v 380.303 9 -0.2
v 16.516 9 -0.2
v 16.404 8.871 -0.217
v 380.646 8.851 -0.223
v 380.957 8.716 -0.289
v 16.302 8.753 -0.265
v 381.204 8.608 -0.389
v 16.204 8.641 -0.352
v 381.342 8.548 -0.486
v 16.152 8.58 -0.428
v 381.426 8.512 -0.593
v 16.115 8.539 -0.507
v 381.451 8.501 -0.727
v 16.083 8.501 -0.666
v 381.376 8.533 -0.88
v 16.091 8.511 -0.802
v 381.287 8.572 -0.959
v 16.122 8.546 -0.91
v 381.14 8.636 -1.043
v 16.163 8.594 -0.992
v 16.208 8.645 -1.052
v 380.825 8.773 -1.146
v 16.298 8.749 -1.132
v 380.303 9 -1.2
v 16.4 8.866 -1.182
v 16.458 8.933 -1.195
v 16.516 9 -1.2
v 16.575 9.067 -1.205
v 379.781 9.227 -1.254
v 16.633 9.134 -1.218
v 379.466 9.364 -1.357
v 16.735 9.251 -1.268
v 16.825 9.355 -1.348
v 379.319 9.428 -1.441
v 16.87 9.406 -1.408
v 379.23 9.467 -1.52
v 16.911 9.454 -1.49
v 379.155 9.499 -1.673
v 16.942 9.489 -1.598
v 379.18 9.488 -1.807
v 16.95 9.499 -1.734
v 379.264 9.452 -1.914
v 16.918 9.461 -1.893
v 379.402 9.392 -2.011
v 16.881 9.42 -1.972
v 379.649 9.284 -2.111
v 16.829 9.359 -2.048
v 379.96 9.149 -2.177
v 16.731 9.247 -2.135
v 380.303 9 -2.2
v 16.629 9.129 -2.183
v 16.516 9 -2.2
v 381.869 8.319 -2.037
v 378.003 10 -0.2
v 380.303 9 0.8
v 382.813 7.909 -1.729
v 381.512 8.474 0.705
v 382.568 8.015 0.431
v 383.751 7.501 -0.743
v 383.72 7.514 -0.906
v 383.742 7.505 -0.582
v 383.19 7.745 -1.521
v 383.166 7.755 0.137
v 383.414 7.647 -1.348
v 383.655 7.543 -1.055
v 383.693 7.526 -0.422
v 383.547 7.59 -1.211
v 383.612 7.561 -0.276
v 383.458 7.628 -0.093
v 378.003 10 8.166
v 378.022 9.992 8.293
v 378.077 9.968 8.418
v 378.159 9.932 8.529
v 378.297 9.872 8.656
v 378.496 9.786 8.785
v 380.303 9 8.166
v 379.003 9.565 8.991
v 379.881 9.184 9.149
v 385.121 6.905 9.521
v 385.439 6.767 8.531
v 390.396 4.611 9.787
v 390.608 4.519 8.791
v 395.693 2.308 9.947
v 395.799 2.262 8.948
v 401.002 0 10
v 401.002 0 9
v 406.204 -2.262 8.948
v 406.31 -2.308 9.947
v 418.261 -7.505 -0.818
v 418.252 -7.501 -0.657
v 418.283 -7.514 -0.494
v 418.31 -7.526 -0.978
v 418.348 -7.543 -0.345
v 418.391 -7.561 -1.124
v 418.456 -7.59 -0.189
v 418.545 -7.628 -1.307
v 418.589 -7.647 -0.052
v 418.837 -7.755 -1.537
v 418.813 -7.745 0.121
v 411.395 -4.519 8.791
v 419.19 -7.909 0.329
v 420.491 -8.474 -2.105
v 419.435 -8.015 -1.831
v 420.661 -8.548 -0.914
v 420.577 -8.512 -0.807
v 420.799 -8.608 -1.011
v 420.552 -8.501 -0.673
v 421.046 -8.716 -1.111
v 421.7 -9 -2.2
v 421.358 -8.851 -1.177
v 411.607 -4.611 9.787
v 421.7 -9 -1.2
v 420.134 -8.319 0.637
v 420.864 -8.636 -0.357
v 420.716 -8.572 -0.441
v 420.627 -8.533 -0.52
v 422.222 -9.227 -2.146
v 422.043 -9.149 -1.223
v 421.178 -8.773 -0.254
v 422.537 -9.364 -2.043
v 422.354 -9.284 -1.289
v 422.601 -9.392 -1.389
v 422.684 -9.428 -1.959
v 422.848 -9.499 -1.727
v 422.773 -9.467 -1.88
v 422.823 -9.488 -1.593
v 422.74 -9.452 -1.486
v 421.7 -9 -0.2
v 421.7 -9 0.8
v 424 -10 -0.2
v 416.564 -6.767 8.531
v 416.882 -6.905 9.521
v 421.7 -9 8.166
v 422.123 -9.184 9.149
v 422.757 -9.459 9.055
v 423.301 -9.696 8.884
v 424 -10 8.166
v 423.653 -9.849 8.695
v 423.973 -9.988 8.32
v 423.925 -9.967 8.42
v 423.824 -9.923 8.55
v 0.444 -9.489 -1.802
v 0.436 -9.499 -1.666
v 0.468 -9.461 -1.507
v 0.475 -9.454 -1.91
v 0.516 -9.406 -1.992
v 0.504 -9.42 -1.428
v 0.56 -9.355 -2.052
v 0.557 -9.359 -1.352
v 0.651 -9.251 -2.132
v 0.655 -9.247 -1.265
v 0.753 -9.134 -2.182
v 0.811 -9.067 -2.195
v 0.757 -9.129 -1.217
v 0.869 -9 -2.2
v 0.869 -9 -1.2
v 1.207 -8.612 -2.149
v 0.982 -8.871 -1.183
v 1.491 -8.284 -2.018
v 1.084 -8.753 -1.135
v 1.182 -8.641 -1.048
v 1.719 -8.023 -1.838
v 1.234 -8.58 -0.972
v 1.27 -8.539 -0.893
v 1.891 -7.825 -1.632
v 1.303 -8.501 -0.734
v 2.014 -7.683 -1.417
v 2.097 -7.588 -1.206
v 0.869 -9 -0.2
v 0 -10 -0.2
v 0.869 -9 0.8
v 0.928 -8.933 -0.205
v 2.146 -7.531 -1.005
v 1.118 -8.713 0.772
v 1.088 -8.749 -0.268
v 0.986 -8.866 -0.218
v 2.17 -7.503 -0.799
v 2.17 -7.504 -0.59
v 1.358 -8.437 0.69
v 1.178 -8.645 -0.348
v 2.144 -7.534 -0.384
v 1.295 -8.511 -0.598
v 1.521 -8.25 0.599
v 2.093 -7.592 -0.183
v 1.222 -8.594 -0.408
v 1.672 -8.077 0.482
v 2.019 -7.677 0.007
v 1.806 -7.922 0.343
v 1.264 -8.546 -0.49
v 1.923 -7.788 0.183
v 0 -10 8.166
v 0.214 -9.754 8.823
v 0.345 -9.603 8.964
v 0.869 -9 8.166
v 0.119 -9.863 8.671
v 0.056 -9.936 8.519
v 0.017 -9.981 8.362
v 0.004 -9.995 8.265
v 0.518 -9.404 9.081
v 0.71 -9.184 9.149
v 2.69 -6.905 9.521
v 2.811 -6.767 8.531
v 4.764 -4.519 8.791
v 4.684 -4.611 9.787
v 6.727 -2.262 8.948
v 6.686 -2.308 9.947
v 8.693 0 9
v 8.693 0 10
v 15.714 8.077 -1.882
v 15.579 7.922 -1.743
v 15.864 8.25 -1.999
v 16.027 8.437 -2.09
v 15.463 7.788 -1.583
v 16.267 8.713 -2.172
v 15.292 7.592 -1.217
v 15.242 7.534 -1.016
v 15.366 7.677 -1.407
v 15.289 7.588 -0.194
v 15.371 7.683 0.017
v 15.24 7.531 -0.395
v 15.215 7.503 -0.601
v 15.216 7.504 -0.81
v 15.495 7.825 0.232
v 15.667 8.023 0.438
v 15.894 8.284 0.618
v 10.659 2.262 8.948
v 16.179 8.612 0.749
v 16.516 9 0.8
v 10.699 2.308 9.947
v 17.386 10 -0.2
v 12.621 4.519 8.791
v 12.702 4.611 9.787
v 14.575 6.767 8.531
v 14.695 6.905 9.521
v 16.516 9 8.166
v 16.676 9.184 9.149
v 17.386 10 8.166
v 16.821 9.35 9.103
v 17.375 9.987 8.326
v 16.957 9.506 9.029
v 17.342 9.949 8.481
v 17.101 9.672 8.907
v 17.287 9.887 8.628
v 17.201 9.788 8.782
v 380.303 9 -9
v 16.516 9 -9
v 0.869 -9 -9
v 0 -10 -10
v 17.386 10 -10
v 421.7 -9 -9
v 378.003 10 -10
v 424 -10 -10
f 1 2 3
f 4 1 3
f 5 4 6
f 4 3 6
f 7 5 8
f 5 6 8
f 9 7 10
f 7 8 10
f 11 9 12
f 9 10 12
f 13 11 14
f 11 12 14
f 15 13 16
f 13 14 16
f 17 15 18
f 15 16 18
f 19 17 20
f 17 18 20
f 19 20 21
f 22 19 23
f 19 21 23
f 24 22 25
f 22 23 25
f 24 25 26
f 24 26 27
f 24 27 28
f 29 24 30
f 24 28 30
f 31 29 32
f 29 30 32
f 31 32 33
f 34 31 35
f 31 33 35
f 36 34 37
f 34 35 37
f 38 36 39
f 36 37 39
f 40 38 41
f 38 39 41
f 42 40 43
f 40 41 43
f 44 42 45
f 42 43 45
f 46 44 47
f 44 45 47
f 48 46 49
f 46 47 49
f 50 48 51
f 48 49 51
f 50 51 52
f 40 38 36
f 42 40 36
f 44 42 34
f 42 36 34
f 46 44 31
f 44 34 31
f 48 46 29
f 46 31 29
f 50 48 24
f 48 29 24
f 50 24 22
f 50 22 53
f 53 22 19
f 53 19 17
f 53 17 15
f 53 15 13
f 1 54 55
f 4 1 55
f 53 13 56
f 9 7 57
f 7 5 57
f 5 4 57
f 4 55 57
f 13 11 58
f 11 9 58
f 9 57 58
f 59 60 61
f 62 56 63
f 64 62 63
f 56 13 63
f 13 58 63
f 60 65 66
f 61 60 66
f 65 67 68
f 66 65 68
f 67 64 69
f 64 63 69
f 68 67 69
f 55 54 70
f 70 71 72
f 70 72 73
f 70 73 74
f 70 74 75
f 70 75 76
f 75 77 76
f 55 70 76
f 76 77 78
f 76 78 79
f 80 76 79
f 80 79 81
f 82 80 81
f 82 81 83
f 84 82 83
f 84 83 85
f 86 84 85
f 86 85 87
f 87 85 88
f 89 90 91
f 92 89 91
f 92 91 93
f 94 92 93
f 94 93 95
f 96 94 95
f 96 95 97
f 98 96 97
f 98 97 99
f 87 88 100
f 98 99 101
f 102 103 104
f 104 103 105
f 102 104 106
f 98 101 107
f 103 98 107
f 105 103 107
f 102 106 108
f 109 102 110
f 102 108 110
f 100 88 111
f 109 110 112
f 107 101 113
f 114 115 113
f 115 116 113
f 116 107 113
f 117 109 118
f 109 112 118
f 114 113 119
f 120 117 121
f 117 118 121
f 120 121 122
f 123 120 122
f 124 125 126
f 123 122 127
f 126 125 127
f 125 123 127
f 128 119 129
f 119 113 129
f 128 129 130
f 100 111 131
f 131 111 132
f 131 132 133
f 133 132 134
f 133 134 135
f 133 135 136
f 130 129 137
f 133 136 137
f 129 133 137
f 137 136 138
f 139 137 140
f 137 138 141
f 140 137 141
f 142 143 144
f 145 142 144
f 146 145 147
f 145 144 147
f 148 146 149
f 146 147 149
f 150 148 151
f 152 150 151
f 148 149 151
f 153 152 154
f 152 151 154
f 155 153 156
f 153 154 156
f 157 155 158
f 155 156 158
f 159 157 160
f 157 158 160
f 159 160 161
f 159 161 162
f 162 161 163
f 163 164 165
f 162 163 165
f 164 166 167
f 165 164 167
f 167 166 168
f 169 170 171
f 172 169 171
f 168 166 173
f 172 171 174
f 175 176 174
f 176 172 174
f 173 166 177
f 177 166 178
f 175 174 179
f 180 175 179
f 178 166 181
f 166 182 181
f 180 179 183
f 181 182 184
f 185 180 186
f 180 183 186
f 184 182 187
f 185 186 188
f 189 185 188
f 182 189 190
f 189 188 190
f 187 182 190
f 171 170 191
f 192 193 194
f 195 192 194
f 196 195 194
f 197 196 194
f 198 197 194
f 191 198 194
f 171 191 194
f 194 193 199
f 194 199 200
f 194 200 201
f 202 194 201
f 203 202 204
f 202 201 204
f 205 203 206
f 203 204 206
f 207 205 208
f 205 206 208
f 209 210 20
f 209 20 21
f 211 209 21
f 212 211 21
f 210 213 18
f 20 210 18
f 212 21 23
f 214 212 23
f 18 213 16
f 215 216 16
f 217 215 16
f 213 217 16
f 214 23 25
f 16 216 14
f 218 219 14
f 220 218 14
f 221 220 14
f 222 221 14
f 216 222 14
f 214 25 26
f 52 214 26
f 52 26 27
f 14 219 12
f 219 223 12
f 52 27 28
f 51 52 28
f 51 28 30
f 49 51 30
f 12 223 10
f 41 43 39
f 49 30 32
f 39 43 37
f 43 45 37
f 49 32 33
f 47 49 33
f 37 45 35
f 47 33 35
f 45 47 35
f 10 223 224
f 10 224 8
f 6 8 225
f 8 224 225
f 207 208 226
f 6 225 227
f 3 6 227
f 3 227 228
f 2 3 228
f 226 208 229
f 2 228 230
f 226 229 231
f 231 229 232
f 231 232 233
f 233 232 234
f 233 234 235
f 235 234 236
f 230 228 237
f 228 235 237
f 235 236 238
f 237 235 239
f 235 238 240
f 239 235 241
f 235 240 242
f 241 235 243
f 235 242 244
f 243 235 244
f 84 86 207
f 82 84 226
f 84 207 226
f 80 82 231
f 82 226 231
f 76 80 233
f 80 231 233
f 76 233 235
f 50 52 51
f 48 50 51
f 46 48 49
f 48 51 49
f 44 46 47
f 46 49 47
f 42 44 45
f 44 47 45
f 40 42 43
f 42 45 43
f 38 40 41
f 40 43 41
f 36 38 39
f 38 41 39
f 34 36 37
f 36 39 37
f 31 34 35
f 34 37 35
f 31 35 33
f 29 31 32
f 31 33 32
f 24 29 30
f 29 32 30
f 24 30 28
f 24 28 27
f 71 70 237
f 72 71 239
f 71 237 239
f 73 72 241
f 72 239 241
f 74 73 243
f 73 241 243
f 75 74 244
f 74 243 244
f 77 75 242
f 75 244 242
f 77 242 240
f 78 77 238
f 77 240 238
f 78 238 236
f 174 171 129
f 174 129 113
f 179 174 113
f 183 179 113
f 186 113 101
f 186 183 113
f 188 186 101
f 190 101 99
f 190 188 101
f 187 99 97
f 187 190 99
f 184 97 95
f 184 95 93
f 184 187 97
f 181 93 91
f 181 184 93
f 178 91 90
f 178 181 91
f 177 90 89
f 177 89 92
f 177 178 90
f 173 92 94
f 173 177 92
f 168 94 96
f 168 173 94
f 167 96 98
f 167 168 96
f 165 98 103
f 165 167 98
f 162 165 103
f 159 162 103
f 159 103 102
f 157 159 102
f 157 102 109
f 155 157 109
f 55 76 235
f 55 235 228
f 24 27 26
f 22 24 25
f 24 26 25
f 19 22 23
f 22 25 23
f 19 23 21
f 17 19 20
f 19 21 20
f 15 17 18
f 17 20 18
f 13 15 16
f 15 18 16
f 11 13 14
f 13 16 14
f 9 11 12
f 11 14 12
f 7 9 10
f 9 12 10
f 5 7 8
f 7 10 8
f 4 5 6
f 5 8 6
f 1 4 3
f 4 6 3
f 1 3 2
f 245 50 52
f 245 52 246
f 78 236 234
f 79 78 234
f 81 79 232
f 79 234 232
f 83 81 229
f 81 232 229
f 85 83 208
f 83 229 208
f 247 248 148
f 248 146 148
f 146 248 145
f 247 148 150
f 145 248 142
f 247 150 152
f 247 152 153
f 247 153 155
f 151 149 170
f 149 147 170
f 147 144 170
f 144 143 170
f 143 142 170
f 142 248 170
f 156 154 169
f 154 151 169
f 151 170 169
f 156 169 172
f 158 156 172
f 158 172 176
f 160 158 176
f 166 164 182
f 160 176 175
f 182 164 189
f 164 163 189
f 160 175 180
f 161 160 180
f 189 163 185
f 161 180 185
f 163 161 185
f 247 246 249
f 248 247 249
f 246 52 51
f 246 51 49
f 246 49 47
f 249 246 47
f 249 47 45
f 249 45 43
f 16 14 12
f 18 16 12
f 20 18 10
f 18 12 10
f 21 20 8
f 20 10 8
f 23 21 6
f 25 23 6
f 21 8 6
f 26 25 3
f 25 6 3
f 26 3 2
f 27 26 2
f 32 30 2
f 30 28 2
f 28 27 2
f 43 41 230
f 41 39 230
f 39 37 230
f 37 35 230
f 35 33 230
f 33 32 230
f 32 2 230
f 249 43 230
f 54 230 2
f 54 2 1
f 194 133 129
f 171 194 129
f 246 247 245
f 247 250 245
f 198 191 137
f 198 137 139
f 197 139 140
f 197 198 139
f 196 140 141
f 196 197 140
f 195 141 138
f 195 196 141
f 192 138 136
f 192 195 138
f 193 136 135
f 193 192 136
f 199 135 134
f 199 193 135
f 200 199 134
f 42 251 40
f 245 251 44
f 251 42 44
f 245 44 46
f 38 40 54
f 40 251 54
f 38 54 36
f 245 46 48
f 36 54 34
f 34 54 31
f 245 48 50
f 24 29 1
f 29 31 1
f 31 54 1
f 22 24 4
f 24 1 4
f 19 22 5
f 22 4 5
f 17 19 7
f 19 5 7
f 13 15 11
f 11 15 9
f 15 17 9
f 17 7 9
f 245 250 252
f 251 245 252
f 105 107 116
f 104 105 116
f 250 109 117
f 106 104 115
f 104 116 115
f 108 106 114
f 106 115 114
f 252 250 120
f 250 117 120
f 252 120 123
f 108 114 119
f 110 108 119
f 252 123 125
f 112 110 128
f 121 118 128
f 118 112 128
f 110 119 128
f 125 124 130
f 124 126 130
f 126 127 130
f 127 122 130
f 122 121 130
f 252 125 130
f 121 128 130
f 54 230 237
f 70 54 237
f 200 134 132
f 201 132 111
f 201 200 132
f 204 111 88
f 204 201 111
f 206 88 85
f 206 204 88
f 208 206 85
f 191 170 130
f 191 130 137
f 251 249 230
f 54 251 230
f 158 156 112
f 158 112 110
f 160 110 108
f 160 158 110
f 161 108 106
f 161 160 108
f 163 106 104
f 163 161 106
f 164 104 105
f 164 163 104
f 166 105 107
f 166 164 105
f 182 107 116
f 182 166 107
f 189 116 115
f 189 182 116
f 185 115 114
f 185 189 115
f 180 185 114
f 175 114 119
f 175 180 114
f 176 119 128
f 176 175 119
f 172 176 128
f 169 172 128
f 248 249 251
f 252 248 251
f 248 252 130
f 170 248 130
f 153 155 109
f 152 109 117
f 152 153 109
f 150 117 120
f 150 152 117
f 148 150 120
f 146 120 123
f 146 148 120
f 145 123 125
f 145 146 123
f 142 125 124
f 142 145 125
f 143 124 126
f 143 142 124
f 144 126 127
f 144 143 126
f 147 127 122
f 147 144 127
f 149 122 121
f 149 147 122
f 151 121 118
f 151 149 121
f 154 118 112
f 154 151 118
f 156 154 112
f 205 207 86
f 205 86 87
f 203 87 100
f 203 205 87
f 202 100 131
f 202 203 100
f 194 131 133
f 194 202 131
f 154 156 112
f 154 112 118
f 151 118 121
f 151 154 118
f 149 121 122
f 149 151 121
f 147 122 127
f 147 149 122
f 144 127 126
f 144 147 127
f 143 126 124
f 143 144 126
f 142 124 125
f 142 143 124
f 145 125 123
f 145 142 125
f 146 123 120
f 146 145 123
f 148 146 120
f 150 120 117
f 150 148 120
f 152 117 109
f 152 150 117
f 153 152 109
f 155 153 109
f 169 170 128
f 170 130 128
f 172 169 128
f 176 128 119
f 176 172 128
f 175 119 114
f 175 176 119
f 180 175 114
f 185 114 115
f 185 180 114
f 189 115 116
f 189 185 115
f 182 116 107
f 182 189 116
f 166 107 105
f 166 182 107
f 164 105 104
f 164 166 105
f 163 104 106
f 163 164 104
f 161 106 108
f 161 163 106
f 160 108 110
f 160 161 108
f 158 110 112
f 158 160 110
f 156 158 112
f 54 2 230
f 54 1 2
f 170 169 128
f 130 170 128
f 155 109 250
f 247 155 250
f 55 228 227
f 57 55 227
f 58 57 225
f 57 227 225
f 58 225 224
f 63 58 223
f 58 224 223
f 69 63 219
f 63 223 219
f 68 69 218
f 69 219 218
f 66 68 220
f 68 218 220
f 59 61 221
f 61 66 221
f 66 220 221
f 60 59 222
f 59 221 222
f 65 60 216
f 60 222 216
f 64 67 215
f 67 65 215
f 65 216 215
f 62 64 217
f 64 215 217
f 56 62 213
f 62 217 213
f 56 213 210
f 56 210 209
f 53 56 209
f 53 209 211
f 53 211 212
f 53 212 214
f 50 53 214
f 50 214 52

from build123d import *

# Parameters (mm, degrees)
F2_DEPTH      = 1000
F4_DEPTH      = 1000
F8_DEPTH      = 10.001
F8_DEPTH_BACK = 10.001


# Not quite as in the source:
# - ends of sketch curves that miss each other by under 0.0002 mm in the source are joined


with BuildPart() as f2:
    # F1 (on Right) → F2 (new body)
    with BuildSketch(Plane.YZ):
        with BuildLine():
            Line((0, -9), (0, -10))
            Line((0, -10), (10, -10))
            Line((10, -10), (10, -0.2))
            Line((10, -0.2), (9, -0.2))
            ThreePointArc((9, -0.2), (8.5, -0.7), (9, -1.2))
            ThreePointArc((9, -1.2), (9.5, -1.7), (9, -2.2))
            Line((9, -2.2), (9, -9))
            Line((9, -9), (0, -9))
        make_face()
    extrude(amount=F2_DEPTH)

    # F5: F2 across plane


with BuildPart() as f4:
    # F3 (on Right) → F4 (new body)
    with BuildSketch(Plane.YZ):
        with BuildLine():
            Line((9, -0.2), (10, -0.2))
            Line((10, -0.2), (10, 8.1663783152))
            ThreePointArc((10, 8.1663783152), (9.7693092582, 8.8052548802), (9.1836734694, 9.1493656277))
            ThreePointArc((9.1836734694, 9.1493656277), (4.6114920912, 9.7868872364), (0, 10))
            Line((0, 10), (0, 9))
            ThreePointArc((0, 9), (4.5192622493, 8.7911494917), (9, 8.1663783152))
            Line((9, 8.1663783152), (9, 0.8))
            ThreePointArc((9, 0.8), (7.5, -0.7), (9, -2.2))
            ThreePointArc((9, -2.2), (9.5, -1.7), (9, -1.2))
            ThreePointArc((9, -1.2), (8.5, -0.7), (9, -0.2))
        make_face()
    extrude(amount=F4_DEPTH)

    # F6: F4 across plane


with BuildPart() as f2_1:
    add(f2.part)
    add(f2.part.mirror(Plane.XZ))


with BuildPart() as f4_1:
    add(f4.part)
    add(f4.part.mirror(Plane.XZ))


with BuildPart() as f8_tool:
    # F7 (on Top) → F8 (new body, two sides)
    with BuildSketch(Plane.XY) as f8_sk:
        Polygon((0, 10), (0, 0), (0, -10), (17.3857347563, 10), align=None)
        Polygon((378.0031490553, 10), (424, -10), (1016.9613361359, -10), (1016.9613361359, 10), (709.9114895723, 10), align=None)
    extrude(amount=F8_DEPTH)
    extrude(f8_sk.sketch, amount=-F8_DEPTH_BACK)


with BuildPart() as f2_2:
    add(f2_1.part)

    # F8: cut by f8_tool
    add(f8_tool.part, mode=Mode.SUBTRACT)


with BuildPart() as f4_2:
    add(f4_1.part)

    # F8: cut by f8_tool
    add(f8_tool.part, mode=Mode.SUBTRACT)


solid = Compound([f2_2.part, f4_2.part])
